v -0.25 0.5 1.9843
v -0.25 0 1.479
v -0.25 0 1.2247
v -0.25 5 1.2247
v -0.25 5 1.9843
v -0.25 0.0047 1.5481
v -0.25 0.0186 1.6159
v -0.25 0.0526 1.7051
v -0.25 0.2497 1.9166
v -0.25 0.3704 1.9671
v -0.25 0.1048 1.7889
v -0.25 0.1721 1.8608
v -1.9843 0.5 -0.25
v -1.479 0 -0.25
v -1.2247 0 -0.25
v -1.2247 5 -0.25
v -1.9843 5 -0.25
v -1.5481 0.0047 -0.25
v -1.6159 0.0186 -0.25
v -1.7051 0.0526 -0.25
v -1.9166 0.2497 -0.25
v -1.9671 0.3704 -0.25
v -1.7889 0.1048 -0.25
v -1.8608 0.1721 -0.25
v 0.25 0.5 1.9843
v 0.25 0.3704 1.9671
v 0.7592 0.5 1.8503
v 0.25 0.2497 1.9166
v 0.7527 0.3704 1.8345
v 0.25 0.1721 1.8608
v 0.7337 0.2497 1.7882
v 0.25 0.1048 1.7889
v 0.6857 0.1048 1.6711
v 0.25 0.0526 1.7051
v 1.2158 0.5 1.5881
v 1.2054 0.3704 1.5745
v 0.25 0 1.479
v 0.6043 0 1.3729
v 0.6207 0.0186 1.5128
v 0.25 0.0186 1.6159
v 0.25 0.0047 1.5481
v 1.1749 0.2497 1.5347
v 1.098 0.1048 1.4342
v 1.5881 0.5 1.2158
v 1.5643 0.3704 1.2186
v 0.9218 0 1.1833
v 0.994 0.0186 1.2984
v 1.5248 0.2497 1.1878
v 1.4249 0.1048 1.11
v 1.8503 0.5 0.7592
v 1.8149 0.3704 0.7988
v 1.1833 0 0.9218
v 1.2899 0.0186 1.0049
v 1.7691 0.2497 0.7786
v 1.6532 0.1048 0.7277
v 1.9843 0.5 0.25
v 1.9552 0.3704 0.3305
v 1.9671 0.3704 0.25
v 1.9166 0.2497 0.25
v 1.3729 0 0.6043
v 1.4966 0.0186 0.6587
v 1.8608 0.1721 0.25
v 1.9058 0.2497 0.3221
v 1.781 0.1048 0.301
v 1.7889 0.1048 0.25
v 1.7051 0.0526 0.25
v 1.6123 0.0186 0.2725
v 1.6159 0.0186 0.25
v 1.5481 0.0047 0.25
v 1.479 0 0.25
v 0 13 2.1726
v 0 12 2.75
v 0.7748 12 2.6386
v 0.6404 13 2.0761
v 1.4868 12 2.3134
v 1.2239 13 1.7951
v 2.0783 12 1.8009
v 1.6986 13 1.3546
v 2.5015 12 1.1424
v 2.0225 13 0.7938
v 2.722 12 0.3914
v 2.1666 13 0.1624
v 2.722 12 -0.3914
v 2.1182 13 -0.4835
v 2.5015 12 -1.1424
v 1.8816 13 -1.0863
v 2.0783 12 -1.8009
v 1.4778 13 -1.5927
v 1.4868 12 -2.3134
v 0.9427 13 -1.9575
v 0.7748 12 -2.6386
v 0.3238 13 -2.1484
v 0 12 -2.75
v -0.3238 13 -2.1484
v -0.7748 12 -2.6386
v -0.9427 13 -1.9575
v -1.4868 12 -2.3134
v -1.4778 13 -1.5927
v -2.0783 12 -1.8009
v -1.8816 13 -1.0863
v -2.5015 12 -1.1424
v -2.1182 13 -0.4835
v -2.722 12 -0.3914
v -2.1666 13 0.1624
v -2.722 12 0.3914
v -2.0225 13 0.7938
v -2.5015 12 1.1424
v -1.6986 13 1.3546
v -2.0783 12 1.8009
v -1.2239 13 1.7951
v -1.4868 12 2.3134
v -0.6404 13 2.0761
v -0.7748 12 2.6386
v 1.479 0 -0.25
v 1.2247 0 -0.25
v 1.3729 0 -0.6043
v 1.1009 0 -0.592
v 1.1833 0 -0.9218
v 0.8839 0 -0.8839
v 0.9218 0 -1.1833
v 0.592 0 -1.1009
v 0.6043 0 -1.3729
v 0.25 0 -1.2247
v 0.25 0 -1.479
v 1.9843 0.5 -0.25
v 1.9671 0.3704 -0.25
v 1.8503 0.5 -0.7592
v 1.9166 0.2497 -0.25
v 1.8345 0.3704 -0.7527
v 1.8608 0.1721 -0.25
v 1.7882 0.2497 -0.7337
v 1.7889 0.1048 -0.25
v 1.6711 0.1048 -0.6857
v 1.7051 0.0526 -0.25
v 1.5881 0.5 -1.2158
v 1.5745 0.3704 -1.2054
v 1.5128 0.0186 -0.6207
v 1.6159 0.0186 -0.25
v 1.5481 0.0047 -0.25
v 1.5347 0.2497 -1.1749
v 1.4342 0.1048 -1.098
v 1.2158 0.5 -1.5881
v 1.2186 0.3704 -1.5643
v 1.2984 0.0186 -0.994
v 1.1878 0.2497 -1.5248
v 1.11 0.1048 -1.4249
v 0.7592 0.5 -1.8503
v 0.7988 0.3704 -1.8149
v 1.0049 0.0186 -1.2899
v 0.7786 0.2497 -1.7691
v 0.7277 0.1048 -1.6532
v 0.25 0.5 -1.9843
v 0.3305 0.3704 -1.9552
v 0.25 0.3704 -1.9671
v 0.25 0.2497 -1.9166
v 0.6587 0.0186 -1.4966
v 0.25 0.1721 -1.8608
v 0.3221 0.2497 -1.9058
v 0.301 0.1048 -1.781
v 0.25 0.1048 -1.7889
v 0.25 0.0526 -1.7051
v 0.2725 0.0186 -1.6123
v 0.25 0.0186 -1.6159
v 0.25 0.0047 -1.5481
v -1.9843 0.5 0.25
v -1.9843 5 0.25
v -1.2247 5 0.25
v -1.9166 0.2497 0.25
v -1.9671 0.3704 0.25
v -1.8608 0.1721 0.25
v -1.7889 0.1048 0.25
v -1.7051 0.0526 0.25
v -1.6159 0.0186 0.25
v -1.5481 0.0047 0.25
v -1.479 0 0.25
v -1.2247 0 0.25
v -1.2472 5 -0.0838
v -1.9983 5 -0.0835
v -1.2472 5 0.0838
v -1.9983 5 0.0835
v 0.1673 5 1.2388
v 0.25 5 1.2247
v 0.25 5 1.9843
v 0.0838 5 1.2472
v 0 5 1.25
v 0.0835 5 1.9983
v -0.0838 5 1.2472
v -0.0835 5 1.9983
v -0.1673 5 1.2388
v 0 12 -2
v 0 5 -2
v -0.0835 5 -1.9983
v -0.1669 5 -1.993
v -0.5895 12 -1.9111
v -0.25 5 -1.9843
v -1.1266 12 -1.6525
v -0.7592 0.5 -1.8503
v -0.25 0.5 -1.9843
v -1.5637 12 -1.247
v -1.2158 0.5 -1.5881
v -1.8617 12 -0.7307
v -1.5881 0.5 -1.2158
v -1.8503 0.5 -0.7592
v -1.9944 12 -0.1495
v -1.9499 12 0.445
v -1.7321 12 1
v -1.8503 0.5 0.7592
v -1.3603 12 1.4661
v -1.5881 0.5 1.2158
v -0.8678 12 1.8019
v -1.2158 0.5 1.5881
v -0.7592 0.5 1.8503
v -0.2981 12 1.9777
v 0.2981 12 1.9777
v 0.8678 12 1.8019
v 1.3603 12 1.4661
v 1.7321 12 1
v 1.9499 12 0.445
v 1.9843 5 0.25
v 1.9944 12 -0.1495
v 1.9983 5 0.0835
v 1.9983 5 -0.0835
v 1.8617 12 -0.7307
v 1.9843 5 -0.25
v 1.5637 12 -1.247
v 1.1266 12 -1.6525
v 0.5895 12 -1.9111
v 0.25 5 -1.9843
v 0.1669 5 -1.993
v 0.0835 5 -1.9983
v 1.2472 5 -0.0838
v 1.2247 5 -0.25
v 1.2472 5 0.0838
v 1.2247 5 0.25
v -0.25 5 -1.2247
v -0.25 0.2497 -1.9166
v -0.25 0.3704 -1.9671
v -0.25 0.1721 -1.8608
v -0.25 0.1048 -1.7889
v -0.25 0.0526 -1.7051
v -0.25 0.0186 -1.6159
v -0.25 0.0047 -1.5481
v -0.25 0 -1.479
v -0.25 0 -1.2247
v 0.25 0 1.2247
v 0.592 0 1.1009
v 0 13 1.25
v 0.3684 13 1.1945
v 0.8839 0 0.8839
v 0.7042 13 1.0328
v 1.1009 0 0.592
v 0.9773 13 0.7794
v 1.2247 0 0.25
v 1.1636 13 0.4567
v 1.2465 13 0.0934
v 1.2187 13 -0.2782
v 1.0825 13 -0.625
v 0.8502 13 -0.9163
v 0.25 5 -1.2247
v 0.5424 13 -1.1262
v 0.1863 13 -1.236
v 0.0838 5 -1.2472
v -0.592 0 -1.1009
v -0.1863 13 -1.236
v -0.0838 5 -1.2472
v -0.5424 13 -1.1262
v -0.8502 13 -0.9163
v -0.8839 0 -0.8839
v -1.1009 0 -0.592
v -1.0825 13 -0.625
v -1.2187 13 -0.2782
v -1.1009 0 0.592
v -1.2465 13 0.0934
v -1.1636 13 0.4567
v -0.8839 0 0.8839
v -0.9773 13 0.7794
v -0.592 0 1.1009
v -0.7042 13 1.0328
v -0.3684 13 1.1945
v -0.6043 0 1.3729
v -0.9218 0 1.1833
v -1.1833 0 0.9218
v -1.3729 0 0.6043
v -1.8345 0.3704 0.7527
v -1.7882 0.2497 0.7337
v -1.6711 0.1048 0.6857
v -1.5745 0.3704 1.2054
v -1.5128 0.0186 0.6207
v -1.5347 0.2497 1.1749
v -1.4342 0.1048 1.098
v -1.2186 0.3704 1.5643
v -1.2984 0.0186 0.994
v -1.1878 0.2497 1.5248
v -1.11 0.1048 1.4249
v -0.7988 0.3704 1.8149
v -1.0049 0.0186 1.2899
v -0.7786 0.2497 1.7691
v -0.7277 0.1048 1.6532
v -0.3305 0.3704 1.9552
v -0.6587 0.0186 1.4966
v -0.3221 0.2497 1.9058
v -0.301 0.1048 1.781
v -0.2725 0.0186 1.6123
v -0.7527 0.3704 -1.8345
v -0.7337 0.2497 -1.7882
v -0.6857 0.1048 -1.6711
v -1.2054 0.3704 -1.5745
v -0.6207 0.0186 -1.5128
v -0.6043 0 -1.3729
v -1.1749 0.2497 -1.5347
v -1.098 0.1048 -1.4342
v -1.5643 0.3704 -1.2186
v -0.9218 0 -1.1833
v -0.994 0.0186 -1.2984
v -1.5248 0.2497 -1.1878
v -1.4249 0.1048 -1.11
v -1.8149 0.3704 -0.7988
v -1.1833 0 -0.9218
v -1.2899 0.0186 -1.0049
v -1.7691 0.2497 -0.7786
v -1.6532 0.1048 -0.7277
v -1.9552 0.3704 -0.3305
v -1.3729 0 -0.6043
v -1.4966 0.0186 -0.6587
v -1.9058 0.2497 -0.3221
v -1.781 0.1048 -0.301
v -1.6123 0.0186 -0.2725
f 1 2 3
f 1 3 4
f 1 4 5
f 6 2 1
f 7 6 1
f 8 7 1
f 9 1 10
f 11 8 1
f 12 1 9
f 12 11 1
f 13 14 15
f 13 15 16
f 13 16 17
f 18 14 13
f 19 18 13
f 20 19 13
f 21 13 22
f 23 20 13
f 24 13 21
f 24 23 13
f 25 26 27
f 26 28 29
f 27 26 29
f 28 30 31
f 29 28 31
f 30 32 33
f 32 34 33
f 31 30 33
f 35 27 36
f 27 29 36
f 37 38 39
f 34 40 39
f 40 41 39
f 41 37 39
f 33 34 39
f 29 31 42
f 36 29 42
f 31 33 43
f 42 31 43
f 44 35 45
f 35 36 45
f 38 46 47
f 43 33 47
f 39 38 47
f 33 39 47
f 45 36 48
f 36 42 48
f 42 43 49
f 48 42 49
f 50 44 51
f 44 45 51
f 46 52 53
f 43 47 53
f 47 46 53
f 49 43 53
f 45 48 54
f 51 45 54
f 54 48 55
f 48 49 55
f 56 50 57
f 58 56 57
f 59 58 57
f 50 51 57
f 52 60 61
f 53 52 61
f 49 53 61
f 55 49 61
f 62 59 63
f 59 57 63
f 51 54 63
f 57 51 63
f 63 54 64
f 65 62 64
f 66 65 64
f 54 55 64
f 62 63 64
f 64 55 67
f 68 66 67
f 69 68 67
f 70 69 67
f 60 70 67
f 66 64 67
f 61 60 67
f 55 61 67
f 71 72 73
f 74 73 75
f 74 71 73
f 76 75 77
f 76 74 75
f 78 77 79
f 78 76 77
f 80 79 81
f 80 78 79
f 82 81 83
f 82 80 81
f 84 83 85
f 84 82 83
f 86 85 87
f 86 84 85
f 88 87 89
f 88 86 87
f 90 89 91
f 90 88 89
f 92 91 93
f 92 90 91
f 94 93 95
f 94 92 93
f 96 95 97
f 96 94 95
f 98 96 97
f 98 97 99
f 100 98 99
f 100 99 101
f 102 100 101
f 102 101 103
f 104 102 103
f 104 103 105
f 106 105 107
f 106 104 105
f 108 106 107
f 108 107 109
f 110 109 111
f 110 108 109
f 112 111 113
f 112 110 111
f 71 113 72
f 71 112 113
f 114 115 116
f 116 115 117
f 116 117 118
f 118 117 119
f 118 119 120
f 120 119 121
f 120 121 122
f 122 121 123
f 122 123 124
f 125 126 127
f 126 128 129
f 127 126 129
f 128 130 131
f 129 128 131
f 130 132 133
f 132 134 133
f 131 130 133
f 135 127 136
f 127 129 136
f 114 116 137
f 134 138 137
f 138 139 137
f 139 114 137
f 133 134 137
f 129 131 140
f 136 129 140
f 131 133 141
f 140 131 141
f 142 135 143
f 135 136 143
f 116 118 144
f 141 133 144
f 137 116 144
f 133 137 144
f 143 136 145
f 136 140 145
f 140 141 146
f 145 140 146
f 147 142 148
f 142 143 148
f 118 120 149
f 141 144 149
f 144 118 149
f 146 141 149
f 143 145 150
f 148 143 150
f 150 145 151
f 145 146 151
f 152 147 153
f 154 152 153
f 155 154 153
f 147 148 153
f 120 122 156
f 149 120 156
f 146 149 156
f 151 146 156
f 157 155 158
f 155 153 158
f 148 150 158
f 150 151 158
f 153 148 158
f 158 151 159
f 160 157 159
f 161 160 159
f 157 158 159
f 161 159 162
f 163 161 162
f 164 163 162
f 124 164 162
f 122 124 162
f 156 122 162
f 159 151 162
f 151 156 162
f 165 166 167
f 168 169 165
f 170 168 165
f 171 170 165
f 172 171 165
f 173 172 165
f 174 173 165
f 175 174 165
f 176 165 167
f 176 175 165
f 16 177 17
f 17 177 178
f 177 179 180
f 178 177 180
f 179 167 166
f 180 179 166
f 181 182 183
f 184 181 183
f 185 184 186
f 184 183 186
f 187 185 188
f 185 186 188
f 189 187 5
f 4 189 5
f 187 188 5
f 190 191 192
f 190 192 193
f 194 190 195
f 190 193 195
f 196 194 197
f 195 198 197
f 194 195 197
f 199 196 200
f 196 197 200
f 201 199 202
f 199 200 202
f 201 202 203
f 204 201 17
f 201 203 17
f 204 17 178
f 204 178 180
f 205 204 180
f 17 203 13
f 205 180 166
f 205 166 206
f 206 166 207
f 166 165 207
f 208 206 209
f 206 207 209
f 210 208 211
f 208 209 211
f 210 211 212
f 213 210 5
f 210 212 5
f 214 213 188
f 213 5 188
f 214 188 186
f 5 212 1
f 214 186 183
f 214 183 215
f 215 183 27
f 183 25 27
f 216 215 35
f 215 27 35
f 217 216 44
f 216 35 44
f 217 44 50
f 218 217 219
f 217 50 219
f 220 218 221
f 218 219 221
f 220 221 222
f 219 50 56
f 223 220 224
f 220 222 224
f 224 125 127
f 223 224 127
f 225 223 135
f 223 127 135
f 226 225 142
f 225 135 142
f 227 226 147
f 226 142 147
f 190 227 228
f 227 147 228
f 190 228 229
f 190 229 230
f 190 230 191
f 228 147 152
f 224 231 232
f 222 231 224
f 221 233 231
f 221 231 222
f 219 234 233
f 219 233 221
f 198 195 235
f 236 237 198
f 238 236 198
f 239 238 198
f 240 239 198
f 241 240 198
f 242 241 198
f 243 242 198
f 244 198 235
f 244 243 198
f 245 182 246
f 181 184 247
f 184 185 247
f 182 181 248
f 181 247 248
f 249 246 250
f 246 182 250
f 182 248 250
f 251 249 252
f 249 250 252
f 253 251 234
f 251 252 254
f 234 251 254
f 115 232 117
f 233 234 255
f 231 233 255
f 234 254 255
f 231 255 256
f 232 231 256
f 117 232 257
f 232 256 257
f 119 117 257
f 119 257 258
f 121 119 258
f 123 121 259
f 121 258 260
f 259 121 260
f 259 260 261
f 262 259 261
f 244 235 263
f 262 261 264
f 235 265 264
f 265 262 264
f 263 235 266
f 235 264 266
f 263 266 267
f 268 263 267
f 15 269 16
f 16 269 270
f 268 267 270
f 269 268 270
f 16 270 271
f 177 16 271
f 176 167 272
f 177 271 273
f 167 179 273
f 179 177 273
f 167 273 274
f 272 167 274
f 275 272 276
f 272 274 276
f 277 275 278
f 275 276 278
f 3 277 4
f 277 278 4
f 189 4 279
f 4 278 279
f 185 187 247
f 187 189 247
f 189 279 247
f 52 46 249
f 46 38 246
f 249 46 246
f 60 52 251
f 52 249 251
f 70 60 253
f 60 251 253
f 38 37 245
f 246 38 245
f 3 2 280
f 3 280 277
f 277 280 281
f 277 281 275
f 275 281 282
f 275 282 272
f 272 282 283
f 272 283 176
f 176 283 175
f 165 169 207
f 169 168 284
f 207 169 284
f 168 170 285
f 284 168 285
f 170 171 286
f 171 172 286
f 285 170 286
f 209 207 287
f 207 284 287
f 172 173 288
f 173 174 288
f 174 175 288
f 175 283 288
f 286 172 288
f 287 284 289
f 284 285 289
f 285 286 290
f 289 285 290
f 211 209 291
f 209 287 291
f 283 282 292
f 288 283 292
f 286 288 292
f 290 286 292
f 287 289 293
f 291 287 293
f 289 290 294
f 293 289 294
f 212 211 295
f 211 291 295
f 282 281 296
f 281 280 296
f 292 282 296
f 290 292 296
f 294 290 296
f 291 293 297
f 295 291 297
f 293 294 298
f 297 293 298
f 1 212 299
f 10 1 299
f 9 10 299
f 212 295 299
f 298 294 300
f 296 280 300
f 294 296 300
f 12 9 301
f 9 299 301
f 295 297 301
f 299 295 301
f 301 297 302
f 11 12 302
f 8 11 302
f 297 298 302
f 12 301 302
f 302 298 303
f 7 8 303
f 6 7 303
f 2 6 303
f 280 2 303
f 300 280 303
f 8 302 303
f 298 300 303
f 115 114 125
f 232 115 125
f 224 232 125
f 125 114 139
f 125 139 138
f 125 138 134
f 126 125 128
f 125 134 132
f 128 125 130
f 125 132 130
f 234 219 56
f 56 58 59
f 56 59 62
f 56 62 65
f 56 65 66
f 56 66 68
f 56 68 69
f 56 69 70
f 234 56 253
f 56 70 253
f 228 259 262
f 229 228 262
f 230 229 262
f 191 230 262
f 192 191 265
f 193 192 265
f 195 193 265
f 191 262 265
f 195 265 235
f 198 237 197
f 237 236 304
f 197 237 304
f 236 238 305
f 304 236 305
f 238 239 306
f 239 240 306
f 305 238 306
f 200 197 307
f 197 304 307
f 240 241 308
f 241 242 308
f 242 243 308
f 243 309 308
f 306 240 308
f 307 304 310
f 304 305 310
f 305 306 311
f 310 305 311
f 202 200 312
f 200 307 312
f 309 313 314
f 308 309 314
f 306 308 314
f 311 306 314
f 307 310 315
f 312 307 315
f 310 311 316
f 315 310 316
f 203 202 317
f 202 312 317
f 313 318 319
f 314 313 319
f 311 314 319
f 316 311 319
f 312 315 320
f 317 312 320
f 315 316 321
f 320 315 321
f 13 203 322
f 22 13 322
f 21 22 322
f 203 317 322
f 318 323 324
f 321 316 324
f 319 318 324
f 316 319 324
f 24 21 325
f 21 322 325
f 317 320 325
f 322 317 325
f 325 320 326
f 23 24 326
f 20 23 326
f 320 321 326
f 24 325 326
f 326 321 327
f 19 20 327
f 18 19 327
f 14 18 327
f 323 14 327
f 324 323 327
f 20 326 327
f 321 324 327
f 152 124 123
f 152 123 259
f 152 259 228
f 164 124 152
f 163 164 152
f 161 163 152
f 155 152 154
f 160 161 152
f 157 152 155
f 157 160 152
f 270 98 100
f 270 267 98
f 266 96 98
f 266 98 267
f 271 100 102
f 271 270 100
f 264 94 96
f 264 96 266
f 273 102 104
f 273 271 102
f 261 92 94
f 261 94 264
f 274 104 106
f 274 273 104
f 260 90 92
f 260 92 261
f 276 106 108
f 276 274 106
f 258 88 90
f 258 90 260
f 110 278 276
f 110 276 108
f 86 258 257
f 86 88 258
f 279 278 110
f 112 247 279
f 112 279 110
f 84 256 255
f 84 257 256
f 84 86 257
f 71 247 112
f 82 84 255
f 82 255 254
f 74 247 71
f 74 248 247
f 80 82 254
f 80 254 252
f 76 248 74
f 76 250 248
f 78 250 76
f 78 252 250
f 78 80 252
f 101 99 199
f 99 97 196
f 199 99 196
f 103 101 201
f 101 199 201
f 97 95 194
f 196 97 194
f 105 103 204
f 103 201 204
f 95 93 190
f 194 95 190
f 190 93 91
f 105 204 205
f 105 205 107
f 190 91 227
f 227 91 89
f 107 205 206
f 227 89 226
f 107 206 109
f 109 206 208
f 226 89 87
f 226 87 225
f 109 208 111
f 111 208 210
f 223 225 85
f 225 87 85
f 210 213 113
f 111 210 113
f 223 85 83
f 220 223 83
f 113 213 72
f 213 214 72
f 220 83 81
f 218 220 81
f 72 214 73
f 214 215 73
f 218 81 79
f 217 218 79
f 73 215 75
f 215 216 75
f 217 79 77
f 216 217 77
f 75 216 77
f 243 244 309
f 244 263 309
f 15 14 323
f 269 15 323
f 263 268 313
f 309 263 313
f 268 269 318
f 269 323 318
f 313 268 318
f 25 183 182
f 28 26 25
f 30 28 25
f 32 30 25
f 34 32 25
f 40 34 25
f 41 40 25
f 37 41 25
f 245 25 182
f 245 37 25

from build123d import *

# Parameters (mm, degrees)
ESQUISSE1_R             = 2
BOSS_EXTRU_1_DEPTH      = 13
ESQUISSE2_R             = 2.75
BOSS_EXTRU_2_DEPTH      = 1
ESQUISSE3_R             = 1.25
ENL_V_MAT_EXTRU_1_DEPTH = 14.569266745
CHANFREIN1_SIZE         = 1
CHANFREIN1_SIZE_2       = 0.577350269
CONG_2_R                = 0.5
ENL_V_MAT_EXTRU_2_DEPTH = 5


with BuildPart() as part:
    # Esquisse1 → Boss.-Extru.1 (new body)
    with BuildSketch(Plane(origin=(0, 0, 0), x_dir=(1, 0, 0), z_dir=(0, 1, 0))):
        with Locations(Location((0, 0, 0), (0, 0, 90))):
            Circle(ESQUISSE1_R)
    extrude(amount=BOSS_EXTRU_1_DEPTH)

    # Esquisse2 → Boss.-Extru.2 (add)
    with BuildSketch(Plane(origin=(0, 13, 0), x_dir=(1, 0, 0), z_dir=(0, 1, 0))):
        with Locations(Location((0, 0, 0), (0, 0, 270))):
            Circle(ESQUISSE2_R)
    extrude(amount=-BOSS_EXTRU_2_DEPTH)

    # Esquisse3 → Enlèv. mat.-Extru.1 (cut, through all)
    with BuildSketch(Plane(origin=(0, 13, 0), x_dir=(1, 0, 0), z_dir=(0, 1, 0))):
        with Locations(Location((0, 0, 0), (0, 0, 270))):
            Circle(ESQUISSE3_R)
    extrude(amount=-ENL_V_MAT_EXTRU_1_DEPTH, mode=Mode.SUBTRACT)

    # Chanfrein1
    # the kernel refuses this chamfer: 1, 0.577350269 mm, written as the material it takes off along each edge
    with BuildSketch(Plane(origin=(0, 13, 0), x_dir=(0, 0, 1), z_dir=(-1, 0, 0))) as chanfrein1_piece_1:
        Polygon((2.75, -CHANFREIN1_SIZE), (2.75 - CHANFREIN1_SIZE_2, 0), (2.75, 0), align=None)
    revolve(axis=Axis((0, 13, 0), (0, 1, 0)), mode=Mode.SUBTRACT)

    # Congé2
    cong_2_edges = [part.edges().sort_by_distance(p)[0] for p in [
        (0, 0, 2),
    ]]
    fillet(cong_2_edges, radius=CONG_2_R)

    # Esquisse4 → Enlèv. mat.-Extru.2 (cut)
    with BuildSketch(Plane.XZ):
        with BuildLine():
            Line((0.25, 1.984313483), (0.25, 1.224744871))
            ThreePointArc((0.25, 1.224744871), (0, 1.25), (-0.25, 1.224744871))
            Line((-0.25, 1.224744871), (-0.25, 1.984313483))
            ThreePointArc((-0.25, 1.984313483), (0, 2), (0.25, 1.984313483))
        make_face()
        with BuildLine():
            Line((1.984313483, 0.25), (1.224744871, 0.25))
            ThreePointArc((1.224744871, 0.25), (1.25, 0), (1.224744871, -0.25))
            Line((1.224744871, -0.25), (1.984313483, -0.25))
            ThreePointArc((1.984313483, -0.25), (2, 0), (1.984313483, 0.25))
        make_face()
        with BuildLine():
            Line((-1.224744871, -0.25), (-1.984313483, -0.25))
            ThreePointArc((-1.984313483, -0.25), (-2, 0), (-1.984313483, 0.25))
            Line((-1.984313483, 0.25), (-1.224744871, 0.25))
            ThreePointArc((-1.224744871, 0.25), (-1.25, 0), (-1.224744871, -0.25))
        make_face()
        with BuildLine():
            Line((0.25, -1.224744871), (0.25, -1.984313483))
            ThreePointArc((0.25, -1.984313483), (0, -2), (-0.25, -1.984313483))
            Line((-0.25, -1.984313483), (-0.25, -1.224744871))
            ThreePointArc((-0.25, -1.224744871), (0, -1.25), (0.25, -1.224744871))
        make_face()
    extrude(amount=-ENL_V_MAT_EXTRU_2_DEPTH, mode=Mode.SUBTRACT)


solid = part.part
